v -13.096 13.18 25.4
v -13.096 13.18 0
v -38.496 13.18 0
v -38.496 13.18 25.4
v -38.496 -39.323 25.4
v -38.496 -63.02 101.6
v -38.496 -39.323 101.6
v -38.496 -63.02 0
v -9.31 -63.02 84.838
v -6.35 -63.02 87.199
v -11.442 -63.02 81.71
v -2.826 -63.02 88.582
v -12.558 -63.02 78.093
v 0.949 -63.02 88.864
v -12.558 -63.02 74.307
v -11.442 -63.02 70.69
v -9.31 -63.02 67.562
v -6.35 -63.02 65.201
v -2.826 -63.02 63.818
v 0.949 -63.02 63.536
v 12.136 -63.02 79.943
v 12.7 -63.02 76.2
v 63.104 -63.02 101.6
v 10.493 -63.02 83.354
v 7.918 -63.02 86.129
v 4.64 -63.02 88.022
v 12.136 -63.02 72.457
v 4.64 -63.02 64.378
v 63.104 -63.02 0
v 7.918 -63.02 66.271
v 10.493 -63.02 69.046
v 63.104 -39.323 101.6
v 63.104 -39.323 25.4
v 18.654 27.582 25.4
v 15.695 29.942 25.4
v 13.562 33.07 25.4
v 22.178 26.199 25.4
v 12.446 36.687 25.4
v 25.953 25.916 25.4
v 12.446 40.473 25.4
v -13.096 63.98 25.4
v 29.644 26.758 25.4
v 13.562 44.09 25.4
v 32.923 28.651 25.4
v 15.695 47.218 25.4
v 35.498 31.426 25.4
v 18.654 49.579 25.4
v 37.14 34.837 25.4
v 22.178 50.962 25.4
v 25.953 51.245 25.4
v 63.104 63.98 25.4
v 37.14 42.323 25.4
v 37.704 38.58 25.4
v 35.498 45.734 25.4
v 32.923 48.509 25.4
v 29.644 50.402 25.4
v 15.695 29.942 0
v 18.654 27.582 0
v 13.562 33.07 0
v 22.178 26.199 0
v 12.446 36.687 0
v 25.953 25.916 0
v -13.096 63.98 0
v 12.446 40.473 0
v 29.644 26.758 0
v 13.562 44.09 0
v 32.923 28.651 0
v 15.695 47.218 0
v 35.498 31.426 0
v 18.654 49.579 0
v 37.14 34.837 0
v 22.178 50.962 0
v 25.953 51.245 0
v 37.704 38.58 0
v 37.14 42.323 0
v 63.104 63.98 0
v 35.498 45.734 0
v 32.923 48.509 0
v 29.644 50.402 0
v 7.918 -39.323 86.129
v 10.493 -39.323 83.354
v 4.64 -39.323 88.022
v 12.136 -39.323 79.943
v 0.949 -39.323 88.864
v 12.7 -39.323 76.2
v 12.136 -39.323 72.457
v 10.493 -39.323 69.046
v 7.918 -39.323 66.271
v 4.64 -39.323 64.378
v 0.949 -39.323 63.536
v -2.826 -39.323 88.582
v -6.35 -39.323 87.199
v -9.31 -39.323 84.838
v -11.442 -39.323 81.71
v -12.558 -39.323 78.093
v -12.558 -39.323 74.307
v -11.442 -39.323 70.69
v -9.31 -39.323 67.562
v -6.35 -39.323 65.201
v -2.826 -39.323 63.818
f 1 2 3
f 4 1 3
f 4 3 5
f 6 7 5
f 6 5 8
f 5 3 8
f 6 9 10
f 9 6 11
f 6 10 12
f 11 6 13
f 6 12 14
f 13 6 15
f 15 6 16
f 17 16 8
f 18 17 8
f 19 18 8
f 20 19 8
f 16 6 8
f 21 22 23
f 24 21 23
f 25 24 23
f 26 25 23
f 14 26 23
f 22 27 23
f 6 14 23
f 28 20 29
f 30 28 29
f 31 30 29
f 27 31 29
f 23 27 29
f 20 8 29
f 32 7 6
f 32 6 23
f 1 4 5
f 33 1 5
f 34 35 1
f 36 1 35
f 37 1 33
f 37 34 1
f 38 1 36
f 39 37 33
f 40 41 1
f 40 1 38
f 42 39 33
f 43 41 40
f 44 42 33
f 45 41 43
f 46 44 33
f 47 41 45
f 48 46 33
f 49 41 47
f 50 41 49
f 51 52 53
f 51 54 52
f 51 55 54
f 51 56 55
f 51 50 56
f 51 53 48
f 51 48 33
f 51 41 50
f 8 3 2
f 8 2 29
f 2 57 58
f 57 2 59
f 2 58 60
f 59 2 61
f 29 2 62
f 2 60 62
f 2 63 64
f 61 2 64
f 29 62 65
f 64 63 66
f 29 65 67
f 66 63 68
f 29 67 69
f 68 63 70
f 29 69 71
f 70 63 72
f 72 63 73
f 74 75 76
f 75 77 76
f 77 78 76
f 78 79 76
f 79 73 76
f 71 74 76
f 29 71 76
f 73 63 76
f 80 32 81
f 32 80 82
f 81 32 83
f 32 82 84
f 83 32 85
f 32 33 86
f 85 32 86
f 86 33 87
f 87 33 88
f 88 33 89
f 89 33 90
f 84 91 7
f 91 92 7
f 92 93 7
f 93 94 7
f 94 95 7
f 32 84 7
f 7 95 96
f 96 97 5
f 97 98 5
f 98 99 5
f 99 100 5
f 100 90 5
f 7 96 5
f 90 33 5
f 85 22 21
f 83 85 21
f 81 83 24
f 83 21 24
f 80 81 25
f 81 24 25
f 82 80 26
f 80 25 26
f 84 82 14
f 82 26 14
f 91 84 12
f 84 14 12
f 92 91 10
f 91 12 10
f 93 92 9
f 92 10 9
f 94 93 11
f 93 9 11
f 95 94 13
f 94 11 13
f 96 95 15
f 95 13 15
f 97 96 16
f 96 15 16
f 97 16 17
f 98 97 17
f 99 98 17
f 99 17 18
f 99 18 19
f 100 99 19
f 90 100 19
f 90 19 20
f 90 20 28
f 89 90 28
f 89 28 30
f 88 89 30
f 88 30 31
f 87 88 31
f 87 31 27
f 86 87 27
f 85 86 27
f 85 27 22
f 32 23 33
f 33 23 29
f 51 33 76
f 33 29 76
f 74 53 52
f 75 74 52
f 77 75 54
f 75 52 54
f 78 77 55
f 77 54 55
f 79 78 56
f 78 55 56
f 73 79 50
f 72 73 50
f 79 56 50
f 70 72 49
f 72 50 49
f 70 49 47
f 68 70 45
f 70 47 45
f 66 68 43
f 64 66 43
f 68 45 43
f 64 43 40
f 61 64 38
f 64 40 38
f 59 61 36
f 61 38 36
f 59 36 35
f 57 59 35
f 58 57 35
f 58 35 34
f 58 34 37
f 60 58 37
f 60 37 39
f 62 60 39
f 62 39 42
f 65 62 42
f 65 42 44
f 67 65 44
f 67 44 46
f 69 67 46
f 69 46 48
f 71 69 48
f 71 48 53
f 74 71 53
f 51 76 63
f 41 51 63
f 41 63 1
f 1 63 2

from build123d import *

# Parameters (mm, degrees)
F1_DEPTH = 101.6
F2_DEPTH = 25.4
F3_R     = 12.7
F4_DEPTH = 127.001
F5_R     = 12.7
F6_DEPTH = 25.401


with BuildPart() as f1:
    # F0 (on Top) → F1 (new body)
    with BuildSketch(Plane.XY):
        Polygon((63.1043637723, -63.0199108629), (63.1043637723, -39.3234714866), (-38.4956362277, -39.3234714866), (-38.4956362277, -63.0199108629), (38.0817614496, -63.0199108629), align=None)
    extrude(amount=F1_DEPTH)

    # F0 (on Top) → F2 (join)
    with BuildSketch(Plane.XY):
        Polygon((63.1043637723, 63.9800891371), (-13.0956362277, 63.9800891371), (-13.0956362277, 13.1800891371), (-38.4956362277, 13.1800891371), (-38.4956362277, -39.3234714866), (63.1043637723, -39.3234714866), align=None)
    extrude(amount=F2_DEPTH)

    # F3 (on face) → F4 (cut, through all)
    with BuildSketch(Plane.XZ.offset(63.0199108629)):
        with Locations((0, 76.2)):
            Circle(F3_R)
    extrude(amount=-F4_DEPTH, mode=Mode.SUBTRACT)

    # F5 (on face) → F6 (cut, through all)
    with BuildSketch(Plane.XY.offset(25.4)):
        with Locations((25.0043637723, 38.5800891371)):
            Circle(F5_R)
    extrude(amount=-F6_DEPTH, mode=Mode.SUBTRACT)


solid = f1.part
